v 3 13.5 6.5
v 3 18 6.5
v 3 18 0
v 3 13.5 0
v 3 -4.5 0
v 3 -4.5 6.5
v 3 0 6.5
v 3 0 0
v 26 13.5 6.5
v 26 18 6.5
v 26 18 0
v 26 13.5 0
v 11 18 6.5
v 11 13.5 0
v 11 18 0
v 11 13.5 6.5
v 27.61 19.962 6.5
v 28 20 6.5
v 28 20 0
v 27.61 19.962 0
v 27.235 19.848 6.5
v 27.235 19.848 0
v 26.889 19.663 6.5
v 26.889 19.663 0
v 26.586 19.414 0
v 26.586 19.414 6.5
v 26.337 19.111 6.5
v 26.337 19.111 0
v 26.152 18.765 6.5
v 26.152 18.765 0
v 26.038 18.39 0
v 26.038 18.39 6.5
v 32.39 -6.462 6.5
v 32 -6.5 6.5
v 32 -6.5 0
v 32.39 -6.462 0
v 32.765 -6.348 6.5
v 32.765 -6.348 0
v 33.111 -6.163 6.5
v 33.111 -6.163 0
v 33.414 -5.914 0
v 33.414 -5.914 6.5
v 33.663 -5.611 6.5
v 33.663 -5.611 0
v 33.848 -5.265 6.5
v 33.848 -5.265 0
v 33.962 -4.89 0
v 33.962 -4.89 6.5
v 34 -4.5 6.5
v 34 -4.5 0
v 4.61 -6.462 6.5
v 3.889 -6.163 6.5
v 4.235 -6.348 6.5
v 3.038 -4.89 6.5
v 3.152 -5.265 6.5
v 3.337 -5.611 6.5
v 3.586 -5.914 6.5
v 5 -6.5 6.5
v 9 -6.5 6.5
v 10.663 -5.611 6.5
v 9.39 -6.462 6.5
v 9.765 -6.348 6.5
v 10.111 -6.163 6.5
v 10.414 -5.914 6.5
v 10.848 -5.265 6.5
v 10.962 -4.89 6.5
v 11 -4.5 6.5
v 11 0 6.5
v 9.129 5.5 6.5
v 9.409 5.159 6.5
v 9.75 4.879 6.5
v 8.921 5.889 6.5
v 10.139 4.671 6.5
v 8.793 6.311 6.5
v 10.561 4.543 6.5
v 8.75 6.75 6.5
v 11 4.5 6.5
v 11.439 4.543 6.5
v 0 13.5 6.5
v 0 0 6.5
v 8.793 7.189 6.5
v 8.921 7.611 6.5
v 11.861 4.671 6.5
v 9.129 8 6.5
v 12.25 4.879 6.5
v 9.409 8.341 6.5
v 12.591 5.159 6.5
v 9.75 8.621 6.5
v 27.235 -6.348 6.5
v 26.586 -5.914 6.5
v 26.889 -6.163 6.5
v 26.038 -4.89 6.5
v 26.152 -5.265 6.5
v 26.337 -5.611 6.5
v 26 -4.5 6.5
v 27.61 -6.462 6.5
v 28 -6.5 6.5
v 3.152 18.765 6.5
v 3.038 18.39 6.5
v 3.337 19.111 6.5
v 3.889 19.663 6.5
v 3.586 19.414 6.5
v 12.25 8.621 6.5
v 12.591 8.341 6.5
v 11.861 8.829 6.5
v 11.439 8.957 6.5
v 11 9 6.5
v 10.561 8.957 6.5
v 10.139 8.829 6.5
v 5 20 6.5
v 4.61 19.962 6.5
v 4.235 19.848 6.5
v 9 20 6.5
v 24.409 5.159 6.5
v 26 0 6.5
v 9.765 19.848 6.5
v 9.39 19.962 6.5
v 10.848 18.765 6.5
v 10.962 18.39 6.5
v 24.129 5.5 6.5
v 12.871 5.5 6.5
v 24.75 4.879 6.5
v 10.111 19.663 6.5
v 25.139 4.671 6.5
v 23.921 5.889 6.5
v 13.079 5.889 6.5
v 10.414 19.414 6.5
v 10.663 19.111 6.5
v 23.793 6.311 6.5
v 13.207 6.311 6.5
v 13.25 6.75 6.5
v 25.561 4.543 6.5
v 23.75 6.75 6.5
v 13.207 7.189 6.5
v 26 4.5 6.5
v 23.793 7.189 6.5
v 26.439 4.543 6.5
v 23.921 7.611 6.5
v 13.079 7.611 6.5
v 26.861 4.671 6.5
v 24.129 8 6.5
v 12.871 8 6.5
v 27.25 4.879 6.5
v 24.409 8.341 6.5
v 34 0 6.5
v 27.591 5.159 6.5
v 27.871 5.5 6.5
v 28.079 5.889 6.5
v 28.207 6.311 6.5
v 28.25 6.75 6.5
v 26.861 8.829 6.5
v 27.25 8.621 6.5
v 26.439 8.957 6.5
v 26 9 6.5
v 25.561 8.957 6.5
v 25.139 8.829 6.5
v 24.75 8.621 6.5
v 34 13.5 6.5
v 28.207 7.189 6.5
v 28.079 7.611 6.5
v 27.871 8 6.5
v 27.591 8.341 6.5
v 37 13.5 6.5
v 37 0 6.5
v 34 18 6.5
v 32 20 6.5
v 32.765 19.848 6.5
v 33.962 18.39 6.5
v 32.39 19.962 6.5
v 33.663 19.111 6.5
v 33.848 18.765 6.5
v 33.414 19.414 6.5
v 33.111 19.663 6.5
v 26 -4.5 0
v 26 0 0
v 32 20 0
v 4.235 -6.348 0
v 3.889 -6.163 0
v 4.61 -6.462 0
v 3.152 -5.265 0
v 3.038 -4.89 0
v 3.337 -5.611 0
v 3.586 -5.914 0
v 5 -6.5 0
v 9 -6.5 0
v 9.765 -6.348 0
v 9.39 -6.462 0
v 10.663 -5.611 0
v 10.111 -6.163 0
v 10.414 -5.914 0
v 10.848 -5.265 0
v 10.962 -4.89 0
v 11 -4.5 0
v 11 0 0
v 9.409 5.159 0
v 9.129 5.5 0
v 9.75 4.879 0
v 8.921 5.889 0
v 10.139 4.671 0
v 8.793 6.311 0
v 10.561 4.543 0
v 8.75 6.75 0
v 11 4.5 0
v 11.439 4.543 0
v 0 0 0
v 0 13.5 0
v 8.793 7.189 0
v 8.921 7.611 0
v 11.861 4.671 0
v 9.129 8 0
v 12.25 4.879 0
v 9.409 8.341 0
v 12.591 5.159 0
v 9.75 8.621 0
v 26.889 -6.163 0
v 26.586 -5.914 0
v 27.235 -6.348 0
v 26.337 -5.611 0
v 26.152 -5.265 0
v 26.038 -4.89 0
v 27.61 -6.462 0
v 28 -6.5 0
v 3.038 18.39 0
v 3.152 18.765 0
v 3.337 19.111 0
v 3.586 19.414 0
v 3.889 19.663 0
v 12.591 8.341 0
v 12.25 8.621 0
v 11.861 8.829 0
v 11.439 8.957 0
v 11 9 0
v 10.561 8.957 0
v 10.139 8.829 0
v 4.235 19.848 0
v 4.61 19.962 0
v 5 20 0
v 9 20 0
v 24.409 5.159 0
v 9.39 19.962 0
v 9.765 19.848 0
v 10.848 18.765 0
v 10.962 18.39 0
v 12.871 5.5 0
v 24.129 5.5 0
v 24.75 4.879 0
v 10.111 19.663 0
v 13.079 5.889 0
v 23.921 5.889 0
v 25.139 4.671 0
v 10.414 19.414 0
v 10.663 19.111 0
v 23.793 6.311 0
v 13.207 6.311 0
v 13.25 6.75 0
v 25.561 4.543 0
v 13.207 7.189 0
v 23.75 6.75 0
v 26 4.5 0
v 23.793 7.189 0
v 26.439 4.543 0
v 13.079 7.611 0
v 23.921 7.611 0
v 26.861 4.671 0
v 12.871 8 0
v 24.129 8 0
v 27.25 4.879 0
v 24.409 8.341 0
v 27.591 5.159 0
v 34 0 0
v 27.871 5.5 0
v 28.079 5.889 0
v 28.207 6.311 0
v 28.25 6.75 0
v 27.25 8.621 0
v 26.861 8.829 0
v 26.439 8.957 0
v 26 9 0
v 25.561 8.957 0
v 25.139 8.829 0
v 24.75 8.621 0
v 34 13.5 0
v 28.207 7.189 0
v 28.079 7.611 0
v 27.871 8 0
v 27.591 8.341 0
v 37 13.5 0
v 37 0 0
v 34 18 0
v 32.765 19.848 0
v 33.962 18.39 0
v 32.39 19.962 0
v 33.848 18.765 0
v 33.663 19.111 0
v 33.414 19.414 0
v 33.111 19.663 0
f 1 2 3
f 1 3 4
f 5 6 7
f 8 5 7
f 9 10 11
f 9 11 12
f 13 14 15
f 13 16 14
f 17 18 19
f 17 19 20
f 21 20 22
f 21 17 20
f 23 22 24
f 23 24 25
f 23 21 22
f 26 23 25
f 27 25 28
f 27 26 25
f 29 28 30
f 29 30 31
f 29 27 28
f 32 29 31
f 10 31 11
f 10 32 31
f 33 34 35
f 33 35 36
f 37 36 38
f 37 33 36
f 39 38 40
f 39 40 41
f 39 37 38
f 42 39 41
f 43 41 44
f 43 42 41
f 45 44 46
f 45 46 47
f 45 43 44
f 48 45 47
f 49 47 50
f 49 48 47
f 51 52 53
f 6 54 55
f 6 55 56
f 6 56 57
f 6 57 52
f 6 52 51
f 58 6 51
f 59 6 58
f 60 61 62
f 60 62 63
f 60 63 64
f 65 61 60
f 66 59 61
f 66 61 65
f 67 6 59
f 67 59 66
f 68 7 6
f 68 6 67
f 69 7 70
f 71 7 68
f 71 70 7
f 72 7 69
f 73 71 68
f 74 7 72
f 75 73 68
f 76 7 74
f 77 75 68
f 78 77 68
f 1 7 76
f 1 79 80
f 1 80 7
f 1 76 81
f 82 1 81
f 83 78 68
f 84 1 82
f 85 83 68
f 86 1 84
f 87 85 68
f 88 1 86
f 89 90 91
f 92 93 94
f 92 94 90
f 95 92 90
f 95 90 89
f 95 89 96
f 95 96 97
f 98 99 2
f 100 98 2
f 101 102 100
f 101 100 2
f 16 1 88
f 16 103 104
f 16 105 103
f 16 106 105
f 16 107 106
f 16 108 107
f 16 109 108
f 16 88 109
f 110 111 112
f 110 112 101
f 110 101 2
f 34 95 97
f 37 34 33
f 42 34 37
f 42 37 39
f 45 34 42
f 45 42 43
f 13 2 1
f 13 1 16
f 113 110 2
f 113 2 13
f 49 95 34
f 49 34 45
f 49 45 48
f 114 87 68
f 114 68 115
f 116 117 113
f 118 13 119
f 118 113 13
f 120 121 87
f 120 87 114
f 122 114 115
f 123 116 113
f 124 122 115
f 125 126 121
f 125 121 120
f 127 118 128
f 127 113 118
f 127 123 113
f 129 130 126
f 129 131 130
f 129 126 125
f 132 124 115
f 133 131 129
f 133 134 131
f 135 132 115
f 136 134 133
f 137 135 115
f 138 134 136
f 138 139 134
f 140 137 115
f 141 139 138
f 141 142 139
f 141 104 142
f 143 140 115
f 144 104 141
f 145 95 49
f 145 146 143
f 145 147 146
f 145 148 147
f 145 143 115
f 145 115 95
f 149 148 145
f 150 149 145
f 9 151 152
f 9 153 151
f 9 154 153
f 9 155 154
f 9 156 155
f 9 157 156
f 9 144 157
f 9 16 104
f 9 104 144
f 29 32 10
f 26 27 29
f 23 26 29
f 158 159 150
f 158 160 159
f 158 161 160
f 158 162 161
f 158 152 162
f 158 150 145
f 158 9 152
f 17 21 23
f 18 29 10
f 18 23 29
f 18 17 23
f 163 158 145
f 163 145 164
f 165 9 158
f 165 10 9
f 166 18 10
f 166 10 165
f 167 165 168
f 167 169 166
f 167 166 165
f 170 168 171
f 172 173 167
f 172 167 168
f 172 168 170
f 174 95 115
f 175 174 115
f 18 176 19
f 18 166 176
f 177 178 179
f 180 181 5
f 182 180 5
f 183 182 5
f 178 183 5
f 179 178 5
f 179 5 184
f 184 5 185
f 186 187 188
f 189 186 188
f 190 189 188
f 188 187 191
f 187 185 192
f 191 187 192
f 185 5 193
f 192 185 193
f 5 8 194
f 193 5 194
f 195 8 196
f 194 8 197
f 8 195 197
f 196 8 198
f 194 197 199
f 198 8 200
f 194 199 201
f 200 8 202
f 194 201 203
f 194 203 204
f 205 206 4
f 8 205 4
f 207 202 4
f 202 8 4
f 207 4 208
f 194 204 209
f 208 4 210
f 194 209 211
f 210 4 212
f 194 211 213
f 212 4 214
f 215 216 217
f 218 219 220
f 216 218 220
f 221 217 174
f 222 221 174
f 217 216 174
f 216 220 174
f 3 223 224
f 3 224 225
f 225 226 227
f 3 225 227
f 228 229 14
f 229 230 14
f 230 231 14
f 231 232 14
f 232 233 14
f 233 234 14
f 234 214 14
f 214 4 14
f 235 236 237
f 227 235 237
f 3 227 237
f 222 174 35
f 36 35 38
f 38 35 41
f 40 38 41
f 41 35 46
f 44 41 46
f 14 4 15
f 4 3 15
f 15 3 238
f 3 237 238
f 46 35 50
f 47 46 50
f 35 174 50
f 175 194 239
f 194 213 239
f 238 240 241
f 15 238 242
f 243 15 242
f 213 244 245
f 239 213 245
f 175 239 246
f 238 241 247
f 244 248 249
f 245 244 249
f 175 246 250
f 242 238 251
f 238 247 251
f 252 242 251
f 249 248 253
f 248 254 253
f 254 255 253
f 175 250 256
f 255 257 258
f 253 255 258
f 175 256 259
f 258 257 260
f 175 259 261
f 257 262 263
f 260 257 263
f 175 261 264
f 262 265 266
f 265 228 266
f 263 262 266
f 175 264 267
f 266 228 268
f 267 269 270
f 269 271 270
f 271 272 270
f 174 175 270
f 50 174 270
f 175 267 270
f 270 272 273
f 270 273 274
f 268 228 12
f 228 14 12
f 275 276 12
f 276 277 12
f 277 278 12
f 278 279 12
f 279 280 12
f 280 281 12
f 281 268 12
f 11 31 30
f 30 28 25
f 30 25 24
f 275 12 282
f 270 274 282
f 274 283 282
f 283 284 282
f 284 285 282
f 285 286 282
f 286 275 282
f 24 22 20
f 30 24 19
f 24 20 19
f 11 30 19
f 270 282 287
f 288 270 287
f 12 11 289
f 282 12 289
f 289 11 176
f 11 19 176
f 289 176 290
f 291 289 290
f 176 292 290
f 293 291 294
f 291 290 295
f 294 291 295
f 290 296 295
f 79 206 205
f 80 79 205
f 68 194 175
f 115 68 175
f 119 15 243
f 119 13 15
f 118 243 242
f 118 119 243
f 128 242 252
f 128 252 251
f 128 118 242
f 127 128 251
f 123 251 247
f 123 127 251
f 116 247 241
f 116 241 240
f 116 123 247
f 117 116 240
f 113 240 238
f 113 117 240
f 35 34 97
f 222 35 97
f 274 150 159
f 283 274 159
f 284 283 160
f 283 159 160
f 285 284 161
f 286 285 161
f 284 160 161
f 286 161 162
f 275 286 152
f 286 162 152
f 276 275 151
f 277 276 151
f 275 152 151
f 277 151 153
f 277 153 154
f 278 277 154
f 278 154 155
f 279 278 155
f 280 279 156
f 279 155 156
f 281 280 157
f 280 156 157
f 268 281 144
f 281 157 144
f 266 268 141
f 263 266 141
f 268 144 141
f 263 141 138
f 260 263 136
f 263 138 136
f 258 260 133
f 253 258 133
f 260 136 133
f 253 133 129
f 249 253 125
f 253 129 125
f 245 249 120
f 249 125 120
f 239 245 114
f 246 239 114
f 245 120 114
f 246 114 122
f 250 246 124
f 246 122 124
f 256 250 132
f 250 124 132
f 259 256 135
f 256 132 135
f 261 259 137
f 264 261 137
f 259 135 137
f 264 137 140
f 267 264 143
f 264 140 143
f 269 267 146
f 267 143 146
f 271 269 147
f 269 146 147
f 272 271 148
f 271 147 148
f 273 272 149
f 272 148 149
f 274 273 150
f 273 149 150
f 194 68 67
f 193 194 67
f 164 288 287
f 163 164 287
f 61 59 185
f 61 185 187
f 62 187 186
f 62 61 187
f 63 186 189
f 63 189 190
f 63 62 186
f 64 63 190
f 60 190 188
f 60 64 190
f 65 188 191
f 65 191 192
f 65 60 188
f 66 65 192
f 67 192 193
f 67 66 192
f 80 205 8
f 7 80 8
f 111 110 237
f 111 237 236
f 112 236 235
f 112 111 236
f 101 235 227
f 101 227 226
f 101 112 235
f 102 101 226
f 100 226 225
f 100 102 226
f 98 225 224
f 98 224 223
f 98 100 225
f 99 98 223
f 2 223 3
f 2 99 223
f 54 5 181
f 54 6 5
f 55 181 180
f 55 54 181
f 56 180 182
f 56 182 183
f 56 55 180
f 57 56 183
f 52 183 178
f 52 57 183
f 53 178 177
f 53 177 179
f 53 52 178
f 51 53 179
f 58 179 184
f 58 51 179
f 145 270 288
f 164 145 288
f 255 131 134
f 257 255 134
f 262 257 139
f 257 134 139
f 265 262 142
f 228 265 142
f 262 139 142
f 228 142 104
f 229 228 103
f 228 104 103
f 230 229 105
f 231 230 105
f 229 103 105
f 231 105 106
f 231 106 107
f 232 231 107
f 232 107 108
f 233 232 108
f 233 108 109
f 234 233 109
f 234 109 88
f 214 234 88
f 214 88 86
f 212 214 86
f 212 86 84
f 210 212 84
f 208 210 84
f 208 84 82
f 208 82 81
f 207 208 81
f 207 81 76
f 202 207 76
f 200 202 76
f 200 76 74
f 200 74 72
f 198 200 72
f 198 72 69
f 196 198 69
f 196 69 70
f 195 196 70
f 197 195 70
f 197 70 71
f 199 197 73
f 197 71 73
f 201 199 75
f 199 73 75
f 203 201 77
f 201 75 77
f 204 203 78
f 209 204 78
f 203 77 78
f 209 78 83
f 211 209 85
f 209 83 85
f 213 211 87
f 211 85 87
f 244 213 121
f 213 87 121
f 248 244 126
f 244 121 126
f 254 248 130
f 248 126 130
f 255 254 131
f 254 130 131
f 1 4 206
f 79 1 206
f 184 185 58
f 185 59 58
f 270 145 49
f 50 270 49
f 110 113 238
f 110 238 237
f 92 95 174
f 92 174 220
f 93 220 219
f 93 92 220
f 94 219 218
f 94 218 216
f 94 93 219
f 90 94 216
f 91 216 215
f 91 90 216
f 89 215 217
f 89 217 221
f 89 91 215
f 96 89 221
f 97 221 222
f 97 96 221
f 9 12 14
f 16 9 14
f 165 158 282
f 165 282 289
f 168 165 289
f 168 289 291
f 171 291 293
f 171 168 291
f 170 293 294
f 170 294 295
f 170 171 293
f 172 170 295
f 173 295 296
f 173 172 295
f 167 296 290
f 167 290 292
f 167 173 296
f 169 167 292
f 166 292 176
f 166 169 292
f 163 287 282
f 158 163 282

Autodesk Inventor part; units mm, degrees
ref_plane "YZ Plane" through (0, 0, 0) normal (1, 0, 0) x (0, 1, 0)
ref_plane "XZ Plane" through (0, 0, 0) normal (0, 1, 0) x (-1, 0, 0)
ref_plane "XY Plane" through (0, 0, 0) normal (0, 0, 1) x (1, 0, 0)
sketch "Sketch1" plane through (0, 0, 0) normal (0, 0, 1) x (1, 0, 0)
  line L0 (0, 0) -> (37, 0)
  line L1 (37, 0) -> (37, 13.5)
  line L2 (37, 13.5) -> (0, 13.5)
  line L3 (0, 13.5) -> (0, 0)
  dimension "d0" = 13.5
  dimension "d1" = 37
extrude "Extrusion1" add sketch "Sketch1" along normal blind 6.5
sketch "Sketch2" plane through (0, 0, 6.5) normal (0, 0, 1) x (1, 0, 0)
  line L0 (0, 0) -> (37, 0) projected
  line L1 (37, 13.5) -> (0, 13.5) projected
  line L2 (3, 13.5) -> (11, 13.5)
  line L3 (11, 13.5) -> (11, 18)
  line L4 (9, 20) -> (5, 20)
  line L5 (3, 18) -> (3, 13.5)
  line L6 (26, 13.5) -> (34, 13.5)
  line L7 (34, 13.5) -> (34, 18)
  line L8 (32, 20) -> (28, 20)
  line L9 (26, 18) -> (26, 13.5)
  line L10 (3, 0) -> (11, 0)
  line L11 (11, 0) -> (11, -4.5)
  line L12 (9, -6.5) -> (5, -6.5)
  line L13 (3, -4.5) -> (3, 0)
  line L14 (26, 0) -> (34, 0)
  line L15 (34, 0) -> (34, -4.5)
  line L16 (32, -6.5) -> (28, -6.5)
  line L17 (26, -4.5) -> (26, 0)
  arc A0 (5, 20) -> (3, 18) centre (5, 18) ccw
  arc A1 (11, 18) -> (9, 20) centre (9, 18) ccw
  arc A2 (28, 20) -> (26, 18) centre (28, 18) ccw
  arc A3 (34, 18) -> (32, 20) centre (32, 18) ccw
  arc A4 (3, -4.5) -> (5, -6.5) centre (5, -4.5) ccw
  arc A5 (9, -6.5) -> (11, -4.5) centre (9, -4.5) ccw
  arc A6 (26, -4.5) -> (28, -6.5) centre (28, -4.5) ccw
  arc A7 (32, -6.5) -> (34, -4.5) centre (32, -4.5) ccw
  line L18 (11, 15.75) -> (26, 15.75) construction
  point P0 (18.5, 15.75)
  point P1 (18.5, 13.5)
  dimension "d4" = 2
  dimension "d5" = 8
  dimension "d6" = 8
  dimension "d7" = 15
  dimension "d8" = 6.5
  dimension "d9" = 6.5
extrude "Extrusion2" add sketch "Sketch2" against normal blind 6.5
sketch "Sketch3" plane through (0, 0, 6.5) normal (0, 0, 1) x (1, 0, 0)
  line L0 (26, 13.5) -> (11, 13.5) projected
  line L1 (0, 13.5) -> (0, 0) projected
  line L2 (11, 6.75) -> (26, 6.75) construction
  circle A0 centre (11, 6.75) radius 2.25
  circle A1 centre (26, 6.75) radius 2.25
  point P0 (18.5, 6.75)
  point P1 (18.5, 13.5)
  point P2 (0, 6.75)
  dimension "d12" = 4.5
  dimension "d13" = 15
extrude "Extrusion3" cut sketch "Sketch3" against normal through all
equation "\"d9\" = d8"
properties part number "y_carriage_belt_iddler_holder" material "Plywood, Finish"
